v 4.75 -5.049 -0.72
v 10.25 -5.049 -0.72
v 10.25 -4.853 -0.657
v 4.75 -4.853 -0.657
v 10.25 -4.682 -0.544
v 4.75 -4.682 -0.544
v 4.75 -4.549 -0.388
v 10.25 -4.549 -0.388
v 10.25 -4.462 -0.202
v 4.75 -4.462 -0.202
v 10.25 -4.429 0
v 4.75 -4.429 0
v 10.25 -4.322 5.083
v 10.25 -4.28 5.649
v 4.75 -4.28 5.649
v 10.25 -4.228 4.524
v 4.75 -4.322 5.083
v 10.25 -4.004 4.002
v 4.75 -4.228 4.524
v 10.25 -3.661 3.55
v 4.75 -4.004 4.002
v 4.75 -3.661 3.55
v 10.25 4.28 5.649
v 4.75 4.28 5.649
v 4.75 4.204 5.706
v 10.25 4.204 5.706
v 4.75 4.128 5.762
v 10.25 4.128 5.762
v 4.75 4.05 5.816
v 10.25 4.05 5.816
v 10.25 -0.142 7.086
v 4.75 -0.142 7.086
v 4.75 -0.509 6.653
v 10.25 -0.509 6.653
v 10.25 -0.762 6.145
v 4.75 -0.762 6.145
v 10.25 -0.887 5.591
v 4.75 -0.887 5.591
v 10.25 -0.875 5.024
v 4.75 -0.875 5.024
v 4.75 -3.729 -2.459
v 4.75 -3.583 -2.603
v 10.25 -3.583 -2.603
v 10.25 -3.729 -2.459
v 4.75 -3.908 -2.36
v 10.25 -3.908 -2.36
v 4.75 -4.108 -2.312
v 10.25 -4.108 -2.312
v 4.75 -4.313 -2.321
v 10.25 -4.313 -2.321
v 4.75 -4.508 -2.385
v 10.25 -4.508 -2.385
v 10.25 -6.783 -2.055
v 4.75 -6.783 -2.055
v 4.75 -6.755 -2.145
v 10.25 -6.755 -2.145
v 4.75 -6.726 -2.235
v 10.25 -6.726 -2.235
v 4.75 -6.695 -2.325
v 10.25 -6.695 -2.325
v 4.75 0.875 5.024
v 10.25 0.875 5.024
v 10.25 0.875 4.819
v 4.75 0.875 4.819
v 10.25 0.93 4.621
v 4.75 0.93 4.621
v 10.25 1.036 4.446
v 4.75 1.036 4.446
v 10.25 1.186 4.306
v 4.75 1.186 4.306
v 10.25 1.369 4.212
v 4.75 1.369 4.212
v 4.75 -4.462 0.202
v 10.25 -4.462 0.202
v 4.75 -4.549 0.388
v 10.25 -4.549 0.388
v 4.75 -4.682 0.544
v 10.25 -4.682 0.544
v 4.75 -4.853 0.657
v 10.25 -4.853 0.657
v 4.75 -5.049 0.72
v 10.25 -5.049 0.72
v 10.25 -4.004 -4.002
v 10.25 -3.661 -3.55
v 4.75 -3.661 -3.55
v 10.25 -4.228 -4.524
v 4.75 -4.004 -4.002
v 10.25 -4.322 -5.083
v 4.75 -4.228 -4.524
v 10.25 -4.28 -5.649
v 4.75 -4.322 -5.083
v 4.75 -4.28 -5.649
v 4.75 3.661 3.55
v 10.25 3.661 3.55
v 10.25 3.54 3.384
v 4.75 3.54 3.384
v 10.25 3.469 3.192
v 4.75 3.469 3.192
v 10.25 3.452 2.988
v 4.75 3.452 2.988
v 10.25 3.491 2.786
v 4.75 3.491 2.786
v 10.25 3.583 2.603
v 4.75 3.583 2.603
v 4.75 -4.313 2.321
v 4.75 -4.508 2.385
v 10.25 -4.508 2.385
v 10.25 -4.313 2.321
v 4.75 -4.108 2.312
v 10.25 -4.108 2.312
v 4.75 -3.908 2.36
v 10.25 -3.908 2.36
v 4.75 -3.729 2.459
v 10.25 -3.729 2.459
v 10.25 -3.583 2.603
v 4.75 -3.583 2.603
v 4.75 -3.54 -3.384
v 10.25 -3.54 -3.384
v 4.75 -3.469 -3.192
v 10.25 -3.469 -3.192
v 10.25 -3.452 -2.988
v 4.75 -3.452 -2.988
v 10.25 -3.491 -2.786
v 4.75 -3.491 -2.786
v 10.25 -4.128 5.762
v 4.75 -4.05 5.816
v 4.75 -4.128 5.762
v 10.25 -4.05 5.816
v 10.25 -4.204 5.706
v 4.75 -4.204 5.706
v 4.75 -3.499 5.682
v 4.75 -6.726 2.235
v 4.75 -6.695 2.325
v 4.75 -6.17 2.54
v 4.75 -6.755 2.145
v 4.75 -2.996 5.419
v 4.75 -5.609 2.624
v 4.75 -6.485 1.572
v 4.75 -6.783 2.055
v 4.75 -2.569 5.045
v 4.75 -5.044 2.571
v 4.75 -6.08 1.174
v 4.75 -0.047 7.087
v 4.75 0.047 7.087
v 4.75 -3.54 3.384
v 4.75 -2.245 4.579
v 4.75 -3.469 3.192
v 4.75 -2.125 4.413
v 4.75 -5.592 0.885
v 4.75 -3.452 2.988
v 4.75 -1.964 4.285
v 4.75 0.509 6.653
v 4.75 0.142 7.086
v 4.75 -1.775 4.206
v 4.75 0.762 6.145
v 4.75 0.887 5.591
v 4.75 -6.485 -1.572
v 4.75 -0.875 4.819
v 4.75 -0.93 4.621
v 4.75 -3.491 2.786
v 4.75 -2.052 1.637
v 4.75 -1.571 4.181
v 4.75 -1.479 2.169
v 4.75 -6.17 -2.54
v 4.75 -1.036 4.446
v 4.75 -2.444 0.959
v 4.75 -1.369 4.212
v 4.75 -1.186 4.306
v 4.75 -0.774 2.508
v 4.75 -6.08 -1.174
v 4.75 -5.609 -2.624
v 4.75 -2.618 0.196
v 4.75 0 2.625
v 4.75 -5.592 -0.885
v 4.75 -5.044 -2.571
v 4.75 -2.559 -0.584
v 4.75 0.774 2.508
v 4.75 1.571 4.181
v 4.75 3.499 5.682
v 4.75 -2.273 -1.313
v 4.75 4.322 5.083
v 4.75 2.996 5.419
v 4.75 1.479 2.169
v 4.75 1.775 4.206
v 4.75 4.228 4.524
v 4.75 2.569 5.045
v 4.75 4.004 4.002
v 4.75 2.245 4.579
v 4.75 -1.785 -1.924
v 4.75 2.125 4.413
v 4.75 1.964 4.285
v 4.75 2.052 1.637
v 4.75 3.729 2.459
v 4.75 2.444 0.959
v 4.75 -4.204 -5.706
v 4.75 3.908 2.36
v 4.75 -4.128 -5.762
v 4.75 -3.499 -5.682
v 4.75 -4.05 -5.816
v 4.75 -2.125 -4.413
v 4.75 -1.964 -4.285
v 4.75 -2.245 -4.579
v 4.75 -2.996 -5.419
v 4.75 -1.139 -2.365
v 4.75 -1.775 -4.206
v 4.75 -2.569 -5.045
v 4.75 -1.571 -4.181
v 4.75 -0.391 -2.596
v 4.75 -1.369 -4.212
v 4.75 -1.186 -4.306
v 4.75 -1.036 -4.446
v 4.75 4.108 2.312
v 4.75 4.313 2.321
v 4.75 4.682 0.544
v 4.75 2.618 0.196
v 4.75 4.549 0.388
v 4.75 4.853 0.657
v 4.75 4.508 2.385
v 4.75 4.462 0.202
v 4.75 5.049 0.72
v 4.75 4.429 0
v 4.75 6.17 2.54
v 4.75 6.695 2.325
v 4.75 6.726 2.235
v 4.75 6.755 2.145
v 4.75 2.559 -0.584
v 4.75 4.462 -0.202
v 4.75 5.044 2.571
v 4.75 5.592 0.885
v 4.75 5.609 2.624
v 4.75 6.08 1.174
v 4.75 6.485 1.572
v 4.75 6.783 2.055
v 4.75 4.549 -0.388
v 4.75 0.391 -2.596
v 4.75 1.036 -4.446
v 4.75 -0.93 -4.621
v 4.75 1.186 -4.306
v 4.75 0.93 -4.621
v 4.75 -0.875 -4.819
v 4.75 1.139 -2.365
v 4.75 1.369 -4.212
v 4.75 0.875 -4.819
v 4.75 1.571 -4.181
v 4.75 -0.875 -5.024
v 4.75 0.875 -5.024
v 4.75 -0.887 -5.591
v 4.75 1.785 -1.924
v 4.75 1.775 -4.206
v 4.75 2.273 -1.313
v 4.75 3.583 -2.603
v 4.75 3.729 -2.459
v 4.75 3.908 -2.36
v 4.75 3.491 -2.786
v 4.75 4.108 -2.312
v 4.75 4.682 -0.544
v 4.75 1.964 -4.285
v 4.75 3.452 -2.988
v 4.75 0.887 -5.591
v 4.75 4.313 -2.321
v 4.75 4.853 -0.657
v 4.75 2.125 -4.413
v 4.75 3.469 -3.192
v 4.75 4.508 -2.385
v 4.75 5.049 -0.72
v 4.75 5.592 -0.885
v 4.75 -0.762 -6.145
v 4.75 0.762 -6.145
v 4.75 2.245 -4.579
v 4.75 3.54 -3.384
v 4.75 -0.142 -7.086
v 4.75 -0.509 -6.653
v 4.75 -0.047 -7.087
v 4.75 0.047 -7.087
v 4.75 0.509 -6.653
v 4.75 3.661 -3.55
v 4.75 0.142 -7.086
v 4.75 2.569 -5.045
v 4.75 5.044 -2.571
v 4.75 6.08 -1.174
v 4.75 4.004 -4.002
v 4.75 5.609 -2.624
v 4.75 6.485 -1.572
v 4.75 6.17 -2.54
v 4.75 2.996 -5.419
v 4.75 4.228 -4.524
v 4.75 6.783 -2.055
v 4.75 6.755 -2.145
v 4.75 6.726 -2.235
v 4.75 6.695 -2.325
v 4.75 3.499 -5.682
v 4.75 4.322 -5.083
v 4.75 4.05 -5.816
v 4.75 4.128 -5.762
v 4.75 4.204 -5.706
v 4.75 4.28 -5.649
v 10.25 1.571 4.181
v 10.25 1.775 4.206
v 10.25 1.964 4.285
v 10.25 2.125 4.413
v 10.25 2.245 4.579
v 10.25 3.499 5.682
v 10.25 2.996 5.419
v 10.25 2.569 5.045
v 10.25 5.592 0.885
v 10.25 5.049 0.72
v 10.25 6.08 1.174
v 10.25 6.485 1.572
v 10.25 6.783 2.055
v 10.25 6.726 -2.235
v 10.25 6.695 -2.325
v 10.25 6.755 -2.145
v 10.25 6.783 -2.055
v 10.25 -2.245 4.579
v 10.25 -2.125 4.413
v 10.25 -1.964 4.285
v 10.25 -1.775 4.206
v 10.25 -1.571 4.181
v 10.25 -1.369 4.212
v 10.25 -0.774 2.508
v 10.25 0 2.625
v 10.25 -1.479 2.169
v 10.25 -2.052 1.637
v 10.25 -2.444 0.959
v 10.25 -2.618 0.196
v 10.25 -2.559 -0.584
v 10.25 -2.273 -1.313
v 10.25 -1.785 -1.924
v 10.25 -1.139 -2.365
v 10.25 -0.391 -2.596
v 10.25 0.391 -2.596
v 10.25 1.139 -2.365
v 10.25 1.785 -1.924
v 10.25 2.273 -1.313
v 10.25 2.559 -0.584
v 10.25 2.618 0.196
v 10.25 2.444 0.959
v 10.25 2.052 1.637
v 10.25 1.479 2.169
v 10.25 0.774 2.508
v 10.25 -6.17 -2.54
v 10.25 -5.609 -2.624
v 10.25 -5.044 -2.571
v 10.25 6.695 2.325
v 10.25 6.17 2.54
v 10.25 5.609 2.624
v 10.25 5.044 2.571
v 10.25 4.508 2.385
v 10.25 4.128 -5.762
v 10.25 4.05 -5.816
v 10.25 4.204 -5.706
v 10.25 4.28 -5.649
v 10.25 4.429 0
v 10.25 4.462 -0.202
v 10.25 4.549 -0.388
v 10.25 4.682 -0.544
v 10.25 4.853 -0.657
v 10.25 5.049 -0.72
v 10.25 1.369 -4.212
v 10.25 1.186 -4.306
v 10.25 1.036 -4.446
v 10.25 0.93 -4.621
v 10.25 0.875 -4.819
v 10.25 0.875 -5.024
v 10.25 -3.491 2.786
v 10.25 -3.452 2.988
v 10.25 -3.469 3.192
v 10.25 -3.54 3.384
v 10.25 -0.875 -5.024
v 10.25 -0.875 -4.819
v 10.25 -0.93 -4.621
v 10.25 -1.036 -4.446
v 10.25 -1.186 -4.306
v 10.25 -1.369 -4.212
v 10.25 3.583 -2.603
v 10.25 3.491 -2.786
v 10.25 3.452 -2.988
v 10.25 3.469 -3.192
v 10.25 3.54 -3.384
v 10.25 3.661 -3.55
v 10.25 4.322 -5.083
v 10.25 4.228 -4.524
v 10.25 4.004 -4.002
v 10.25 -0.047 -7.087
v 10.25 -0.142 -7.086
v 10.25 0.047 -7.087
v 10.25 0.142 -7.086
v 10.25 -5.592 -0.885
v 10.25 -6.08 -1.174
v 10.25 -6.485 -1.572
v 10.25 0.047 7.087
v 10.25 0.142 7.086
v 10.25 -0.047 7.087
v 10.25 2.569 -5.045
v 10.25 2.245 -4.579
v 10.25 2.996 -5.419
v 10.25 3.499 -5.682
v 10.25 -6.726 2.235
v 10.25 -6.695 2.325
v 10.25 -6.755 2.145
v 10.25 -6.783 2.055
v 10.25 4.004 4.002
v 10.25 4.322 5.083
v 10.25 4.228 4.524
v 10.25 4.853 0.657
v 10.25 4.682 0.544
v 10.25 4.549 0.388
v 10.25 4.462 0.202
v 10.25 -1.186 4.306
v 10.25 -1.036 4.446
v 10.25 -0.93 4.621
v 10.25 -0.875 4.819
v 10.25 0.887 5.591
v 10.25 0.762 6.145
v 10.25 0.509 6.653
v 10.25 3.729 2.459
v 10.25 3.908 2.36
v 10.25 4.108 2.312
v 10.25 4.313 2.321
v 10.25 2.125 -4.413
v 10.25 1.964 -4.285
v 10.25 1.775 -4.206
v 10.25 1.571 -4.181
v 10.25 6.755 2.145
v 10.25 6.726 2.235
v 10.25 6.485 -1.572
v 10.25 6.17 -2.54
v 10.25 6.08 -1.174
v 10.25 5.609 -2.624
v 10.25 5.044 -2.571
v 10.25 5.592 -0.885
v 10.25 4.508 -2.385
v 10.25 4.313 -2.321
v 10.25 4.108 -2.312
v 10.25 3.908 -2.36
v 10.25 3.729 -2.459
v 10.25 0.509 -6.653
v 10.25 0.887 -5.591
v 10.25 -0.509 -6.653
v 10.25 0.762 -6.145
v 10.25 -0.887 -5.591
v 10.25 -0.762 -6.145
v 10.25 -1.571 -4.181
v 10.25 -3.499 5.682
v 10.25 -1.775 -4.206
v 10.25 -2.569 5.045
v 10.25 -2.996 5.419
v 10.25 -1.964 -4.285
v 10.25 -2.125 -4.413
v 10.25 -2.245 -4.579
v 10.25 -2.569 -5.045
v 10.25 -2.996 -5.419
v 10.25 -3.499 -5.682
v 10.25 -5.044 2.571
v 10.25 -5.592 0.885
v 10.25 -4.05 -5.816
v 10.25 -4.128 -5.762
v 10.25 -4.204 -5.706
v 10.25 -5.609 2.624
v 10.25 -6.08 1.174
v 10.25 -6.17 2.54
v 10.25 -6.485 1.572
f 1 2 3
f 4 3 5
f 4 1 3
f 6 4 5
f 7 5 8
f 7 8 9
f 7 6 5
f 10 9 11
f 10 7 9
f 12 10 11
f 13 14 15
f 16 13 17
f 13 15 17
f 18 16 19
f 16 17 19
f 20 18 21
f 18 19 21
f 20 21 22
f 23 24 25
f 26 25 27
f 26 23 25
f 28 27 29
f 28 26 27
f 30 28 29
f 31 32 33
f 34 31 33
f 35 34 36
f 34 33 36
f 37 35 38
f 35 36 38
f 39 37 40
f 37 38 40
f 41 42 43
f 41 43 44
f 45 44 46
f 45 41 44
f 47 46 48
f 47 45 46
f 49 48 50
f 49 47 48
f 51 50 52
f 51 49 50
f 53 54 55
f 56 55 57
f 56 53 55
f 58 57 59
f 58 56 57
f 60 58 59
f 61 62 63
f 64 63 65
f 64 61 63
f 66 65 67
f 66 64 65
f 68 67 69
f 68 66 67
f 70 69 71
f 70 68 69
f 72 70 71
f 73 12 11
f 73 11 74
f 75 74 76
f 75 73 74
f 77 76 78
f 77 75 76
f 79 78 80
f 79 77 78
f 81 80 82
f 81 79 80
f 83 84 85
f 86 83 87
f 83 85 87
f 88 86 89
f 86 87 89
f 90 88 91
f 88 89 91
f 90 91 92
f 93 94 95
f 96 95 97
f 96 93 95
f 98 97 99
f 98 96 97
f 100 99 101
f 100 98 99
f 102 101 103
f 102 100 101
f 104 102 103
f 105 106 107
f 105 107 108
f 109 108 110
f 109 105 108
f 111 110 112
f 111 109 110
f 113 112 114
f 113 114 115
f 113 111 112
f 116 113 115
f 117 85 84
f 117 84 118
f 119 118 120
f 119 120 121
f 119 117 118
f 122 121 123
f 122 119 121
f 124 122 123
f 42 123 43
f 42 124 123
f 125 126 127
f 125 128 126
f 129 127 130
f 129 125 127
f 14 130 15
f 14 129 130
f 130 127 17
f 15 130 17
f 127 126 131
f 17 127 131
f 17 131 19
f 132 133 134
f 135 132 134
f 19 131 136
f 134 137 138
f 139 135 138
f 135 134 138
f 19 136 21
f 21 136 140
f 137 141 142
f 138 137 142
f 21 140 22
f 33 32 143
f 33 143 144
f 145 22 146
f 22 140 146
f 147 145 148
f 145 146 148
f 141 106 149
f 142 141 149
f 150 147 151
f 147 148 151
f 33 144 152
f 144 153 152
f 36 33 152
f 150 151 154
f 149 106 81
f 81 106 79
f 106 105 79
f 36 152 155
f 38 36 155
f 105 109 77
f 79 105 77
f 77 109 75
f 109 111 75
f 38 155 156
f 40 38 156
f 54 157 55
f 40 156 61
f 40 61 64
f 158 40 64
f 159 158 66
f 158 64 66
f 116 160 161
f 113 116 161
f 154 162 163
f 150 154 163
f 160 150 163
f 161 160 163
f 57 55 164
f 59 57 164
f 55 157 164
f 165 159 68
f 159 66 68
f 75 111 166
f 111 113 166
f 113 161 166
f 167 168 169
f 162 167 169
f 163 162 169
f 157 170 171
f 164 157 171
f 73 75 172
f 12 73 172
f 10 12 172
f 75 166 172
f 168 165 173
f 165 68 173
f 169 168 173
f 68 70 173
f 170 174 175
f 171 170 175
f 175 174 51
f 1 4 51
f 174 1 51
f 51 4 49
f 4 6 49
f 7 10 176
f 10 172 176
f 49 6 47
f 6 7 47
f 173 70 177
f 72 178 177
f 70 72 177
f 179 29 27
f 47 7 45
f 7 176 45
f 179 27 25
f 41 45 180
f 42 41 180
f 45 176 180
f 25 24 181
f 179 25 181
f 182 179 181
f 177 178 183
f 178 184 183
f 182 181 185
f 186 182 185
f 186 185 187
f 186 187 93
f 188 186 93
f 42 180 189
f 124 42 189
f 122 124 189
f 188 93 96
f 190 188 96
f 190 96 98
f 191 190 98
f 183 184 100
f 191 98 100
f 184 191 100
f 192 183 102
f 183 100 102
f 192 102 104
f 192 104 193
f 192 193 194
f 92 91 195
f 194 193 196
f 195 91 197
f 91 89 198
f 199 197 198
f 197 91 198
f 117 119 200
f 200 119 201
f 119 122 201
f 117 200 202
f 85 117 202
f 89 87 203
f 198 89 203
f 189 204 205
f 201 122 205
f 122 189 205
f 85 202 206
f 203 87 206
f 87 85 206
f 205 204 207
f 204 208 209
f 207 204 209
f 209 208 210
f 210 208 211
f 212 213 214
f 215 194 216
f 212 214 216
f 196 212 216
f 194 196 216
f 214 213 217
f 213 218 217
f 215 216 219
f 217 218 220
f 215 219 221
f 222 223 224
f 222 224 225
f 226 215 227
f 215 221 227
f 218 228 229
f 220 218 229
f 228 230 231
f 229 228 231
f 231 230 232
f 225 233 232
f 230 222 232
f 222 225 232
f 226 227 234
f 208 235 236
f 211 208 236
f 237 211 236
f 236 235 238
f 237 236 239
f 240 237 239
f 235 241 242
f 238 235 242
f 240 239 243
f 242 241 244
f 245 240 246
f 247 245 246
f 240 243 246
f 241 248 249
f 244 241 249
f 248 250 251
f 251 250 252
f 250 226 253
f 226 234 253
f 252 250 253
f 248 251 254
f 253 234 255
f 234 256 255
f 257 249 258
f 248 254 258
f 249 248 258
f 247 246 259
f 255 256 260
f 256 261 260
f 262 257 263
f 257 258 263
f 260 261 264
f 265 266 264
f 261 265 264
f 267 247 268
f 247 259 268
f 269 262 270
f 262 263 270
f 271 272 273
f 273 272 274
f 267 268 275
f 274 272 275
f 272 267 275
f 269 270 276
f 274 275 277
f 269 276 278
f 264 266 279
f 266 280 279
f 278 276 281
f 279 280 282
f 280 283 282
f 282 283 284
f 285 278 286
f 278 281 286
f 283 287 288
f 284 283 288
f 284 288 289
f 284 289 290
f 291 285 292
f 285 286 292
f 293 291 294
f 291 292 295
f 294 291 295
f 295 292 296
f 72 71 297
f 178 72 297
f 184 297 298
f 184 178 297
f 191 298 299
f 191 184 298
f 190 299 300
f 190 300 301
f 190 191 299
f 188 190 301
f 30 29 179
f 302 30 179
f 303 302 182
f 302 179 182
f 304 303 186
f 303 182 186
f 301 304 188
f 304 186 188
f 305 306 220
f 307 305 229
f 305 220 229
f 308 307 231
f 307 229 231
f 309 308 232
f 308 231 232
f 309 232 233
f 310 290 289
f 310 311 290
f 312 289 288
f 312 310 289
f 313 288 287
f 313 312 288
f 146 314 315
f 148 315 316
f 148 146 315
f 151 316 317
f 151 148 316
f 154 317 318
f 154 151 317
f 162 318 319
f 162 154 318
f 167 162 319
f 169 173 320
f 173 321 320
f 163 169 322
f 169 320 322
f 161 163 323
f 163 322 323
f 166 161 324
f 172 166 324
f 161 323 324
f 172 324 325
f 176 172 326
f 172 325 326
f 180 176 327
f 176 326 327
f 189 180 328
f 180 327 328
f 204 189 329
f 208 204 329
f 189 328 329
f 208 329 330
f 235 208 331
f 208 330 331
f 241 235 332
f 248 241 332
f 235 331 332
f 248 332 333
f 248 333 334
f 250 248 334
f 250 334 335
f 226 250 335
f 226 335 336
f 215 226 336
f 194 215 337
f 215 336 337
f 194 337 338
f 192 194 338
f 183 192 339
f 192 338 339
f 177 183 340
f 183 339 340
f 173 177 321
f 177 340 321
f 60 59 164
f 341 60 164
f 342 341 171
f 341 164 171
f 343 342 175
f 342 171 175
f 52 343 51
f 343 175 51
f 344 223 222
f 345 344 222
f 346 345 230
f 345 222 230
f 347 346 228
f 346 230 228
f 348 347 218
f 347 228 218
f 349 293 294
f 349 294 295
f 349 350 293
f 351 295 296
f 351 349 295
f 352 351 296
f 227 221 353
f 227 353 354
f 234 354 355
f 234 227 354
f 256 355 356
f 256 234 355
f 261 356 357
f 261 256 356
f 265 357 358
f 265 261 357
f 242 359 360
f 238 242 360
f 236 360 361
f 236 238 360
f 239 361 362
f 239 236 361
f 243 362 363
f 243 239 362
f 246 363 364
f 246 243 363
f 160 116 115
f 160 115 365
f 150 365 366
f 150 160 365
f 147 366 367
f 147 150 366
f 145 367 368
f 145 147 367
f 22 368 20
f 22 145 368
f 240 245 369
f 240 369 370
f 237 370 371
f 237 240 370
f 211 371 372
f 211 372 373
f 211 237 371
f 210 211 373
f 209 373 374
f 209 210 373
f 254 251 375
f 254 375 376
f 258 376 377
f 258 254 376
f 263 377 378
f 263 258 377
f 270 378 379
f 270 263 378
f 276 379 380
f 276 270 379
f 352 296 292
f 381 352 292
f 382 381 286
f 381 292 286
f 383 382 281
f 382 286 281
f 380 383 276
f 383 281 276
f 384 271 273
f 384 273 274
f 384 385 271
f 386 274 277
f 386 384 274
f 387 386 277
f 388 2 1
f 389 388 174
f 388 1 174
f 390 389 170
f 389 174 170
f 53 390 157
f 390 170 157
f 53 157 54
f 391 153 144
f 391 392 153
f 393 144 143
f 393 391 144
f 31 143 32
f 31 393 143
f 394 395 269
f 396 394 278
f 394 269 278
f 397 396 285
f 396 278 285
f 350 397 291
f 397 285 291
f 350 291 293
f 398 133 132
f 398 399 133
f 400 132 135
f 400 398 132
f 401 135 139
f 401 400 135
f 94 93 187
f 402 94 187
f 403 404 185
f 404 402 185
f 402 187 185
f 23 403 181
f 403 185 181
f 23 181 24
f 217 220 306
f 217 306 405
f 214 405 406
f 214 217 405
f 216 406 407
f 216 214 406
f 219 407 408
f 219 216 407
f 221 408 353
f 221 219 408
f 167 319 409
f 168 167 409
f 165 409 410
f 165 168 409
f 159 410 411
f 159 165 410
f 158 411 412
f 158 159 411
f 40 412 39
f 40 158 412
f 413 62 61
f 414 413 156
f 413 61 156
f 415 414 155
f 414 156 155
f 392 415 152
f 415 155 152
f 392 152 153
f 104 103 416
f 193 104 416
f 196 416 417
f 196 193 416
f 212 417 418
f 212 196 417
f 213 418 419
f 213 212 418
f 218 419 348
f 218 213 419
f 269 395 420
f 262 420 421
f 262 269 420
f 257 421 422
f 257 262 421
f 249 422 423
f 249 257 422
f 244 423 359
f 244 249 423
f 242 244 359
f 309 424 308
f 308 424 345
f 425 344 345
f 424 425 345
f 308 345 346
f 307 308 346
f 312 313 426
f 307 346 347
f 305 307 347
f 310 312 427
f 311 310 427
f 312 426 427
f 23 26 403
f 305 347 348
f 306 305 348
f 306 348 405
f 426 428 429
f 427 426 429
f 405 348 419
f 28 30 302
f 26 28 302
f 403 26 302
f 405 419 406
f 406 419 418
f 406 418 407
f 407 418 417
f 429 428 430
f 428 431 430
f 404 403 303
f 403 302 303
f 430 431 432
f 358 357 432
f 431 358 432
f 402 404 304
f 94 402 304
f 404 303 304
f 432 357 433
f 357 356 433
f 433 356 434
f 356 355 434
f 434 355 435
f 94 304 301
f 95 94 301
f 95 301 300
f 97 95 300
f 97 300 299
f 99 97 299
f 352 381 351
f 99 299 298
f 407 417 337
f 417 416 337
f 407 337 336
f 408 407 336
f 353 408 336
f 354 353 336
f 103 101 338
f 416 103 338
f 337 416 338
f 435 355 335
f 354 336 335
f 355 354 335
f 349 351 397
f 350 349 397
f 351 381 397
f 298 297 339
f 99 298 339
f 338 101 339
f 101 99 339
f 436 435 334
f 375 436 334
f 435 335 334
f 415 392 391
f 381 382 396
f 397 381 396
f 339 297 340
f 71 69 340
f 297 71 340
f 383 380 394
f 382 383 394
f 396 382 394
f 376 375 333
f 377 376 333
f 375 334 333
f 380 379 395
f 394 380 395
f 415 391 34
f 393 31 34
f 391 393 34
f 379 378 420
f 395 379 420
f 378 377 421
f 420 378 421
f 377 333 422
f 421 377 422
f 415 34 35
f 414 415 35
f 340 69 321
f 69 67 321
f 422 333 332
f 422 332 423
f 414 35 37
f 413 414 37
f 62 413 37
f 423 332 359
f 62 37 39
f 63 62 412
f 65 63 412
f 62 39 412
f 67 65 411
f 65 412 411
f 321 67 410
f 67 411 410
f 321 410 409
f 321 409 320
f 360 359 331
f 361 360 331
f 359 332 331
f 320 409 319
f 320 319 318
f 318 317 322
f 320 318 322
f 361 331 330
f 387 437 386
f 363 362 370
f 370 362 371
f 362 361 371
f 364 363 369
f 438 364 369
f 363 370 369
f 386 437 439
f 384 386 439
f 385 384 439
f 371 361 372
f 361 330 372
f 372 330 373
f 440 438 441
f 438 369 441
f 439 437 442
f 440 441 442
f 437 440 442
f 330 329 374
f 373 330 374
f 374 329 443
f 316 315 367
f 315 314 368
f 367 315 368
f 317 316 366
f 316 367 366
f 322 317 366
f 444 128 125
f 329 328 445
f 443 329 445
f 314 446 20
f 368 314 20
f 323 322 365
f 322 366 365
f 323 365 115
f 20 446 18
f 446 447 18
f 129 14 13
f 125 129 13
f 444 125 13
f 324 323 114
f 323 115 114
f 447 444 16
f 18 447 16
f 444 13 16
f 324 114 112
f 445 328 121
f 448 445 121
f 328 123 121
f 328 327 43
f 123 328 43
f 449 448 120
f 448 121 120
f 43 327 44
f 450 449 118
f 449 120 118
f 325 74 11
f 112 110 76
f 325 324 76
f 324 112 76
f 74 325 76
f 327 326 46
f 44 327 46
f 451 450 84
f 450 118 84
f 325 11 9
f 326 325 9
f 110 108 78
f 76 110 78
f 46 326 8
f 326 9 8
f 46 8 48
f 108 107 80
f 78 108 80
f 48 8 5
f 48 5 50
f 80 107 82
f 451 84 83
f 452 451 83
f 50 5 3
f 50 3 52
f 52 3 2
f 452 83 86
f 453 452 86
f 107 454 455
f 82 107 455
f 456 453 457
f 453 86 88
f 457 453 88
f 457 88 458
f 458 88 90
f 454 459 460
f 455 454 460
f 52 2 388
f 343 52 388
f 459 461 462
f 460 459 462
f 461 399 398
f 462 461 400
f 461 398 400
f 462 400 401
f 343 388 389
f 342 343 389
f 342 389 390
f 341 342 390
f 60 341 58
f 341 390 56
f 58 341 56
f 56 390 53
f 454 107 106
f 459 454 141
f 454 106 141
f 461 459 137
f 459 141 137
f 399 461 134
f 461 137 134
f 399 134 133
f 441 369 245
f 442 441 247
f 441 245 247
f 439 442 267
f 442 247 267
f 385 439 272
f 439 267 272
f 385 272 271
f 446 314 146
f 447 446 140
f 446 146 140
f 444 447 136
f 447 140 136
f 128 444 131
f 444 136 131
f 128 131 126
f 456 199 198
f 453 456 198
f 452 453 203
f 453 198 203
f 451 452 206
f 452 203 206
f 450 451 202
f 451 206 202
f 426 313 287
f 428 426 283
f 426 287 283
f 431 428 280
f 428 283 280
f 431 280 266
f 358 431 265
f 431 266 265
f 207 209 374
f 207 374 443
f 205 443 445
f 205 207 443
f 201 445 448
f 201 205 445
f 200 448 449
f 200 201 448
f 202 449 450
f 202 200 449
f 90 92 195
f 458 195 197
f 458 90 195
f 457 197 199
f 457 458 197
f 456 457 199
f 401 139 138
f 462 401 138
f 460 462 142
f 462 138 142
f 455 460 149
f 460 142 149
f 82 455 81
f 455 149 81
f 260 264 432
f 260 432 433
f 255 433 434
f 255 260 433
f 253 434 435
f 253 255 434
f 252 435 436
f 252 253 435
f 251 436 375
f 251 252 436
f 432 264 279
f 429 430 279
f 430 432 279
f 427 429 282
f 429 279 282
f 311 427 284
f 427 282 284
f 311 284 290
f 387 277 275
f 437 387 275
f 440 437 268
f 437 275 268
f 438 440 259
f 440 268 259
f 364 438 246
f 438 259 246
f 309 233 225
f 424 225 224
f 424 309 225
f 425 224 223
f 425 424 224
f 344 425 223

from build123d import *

# Parameters (mm, degrees)
BASPROSKE_W        = 10
BASPROSKE_H        = 6.75
TOOTHCUT_DEPTH     = 14.824796563
TEETHCUTS_COUNT    = 10
TEETHCUTS_ANGLE    = 324
BORSKE_R           = 2.5
BORE_DEPTH         = 50.0000508
SCALE1_SCALE       = 1.05
FILLET1_R          = 0.75
CUT_EXTRUDE1_START = -10.5
SKETCH1_R          = 10.265831804
CUT_EXTRUDE1_DEPTH = 5


with BuildPart() as part:
    # BasProSke → Base-Revolve (revolve)
    with BuildSketch(Plane(origin=(0, 0, 0), x_dir=(1, 0, 0), z_dir=(0, 1, 0)), mode=Mode.PRIVATE) as base_revolve_sk:
        with Locations((5, 3.375)):
            Rectangle(BASPROSKE_W, BASPROSKE_H)
    revolve(base_revolve_sk.sketch.rotate(Axis((-10, 0, 0), (1, 0, 0)), 180), axis=Axis((-10, 0, 0), (1, 0, 0)))

    # TooCutSke → ToothCut (cut, through all)
    with BuildSketch(Plane(origin=(0, 0, 0), x_dir=(0, 0, -1), z_dir=(1, 0, 0))):
        with BuildLine():
            ThreePointArc((0.665884296, 4.164854519), (0, 4.21775), (-0.665884296, 4.164854519))
            ThreePointArc((-0.665884296, 4.164854519), (-0.949936307, 5.537806691), (-1.991778305, 6.476022262))
            ThreePointArc((-1.991778305, 6.476022262), (0, 6.7754), (1.991778305, 6.476022262))
            ThreePointArc((1.991778305, 6.476022262), (0.949936307, 5.537806691), (0.665884296, 4.164854519))
        make_face()
    toothcut = extrude(amount=TOOTHCUT_DEPTH, mode=Mode.SUBTRACT)

    # TeethCuts: ToothCut ×10 about axis
    teethcuts_axis = Axis((-10, 0, 0), (1, 0, 0))
    for i in range(1, TEETHCUTS_COUNT):
        add(toothcut.rotate(teethcuts_axis, i * TEETHCUTS_ANGLE / (TEETHCUTS_COUNT - 1)), mode=Mode.SUBTRACT)

    # BorSke → Bore (cut, symmetric)
    with BuildSketch(Plane(origin=(0, 0, 0), x_dir=(0, 0, -1), z_dir=(1, 0, 0))):
        with Locations(Location((0, 0, 0), (0, 0, 180))):
            Circle(BORSKE_R)
    extrude(amount=BORE_DEPTH, both=True, mode=Mode.SUBTRACT)


with BuildPart() as part_1:
    # Scale1: scaled about (5, 0, 0)
    add(part.part.scale(SCALE1_SCALE).moved(Location((-0.25, 0, 0))))

    # Fillet1
    # the kernel refuses this fillet: 0.75 mm, written as the material it adds along each edge
    with BuildSketch(Plane(origin=(-0.25, 3.126943172, -3.136089365), x_dir=(0, 0.6486282387058202, 0.7611053855763902), z_dir=(1, 0, 0)), Plane(origin=(-0.25, 0.686403088, -4.375120673), x_dir=(0, 0.9721177892266772, 0.23449307850987308), z_dir=(1, 0, 0)), Plane(origin=(-0.25, -2.016319645, -3.94300459), x_dir=(0, 0.9242913853313495, -0.38168761442081794), z_dir=(1, 0, 0)), Plane(origin=(-0.25, -3.948876807, -2.004794771), x_dir=(0, 0.5234170877481713, -0.8520766117276212), z_dir=(1, 0, 0)), Plane(origin=(-0.25, -4.373097245, 0.69917851), x_dir=(0, -0.07738474706232469, -0.9970013043733192), z_dir=(1, 0, 0))) as fillet1_piece_1:
        with BuildLine():
            CenterArc((0.778083465, -0.747536247), FILLET1_R, 94.645414963, 79.810658705)
            ThreePointArc((0.031591647, -0.675079607), (0.040059779, -0.336404325), (0, 0))
            ThreePointArc((0, 0), (0.358670863, -0.01454809), (0.717341725, 0))
        make_face()
    extrude(amount=10.5)
    with BuildSketch(Plane(origin=(-0.25, 3.948876807, -2.004794771), x_dir=(0, 0.8266776070022068, -0.562675869467587), z_dir=(1, 0, 0)), Plane(origin=(-0.25, 2.016319645, -3.94300459), x_dir=(0, 0.3380636550401047, -0.9411232465203083), z_dir=(1, 0, 0)), Plane(origin=(-0.25, -0.686403088, -4.375120673), x_dir=(0, -0.27967912278629736, -0.9600935310049158), z_dir=(1, 0, 0)), Plane(origin=(-0.25, -3.126943172, -3.136089365), x_dir=(0, -0.7905939816520889, -0.6123407190245448), z_dir=(1, 0, 0)), Plane(origin=(-0.25, -4.373097245, -0.69917851), x_dir=(0, -0.9995288108278918, -0.030694565072345244), z_dir=(1, 0, 0))) as fillet1_piece_2:
        with BuildLine():
            CenterArc((0.78309116, -0.742288727), FILLET1_R, 98.223237645, 79.810658705)
            ThreePointArc((0.033532686, -0.716557541), (0.031298529, -0.357598709), (0, 0))
            ThreePointArc((0, 0), (0.337909199, -0.024290509), (0.675818399, 0))
        make_face()
    extrude(amount=10.5)
    with BuildSketch(Plane(origin=(-0.25, -3.948876807, 2.004794771), x_dir=(0, 0.5234170877481569, 0.8520766117276299), z_dir=(1, 0, 0)), Plane(origin=(-0.25, -2.016319645, 3.94300459), x_dir=(0, 0.9242913853313433, 0.38168761442083243), z_dir=(1, 0, 0)), Plane(origin=(-0.25, 0.686403088, 4.375120673), x_dir=(0, 0.9721177892266811, -0.23449307850985693), z_dir=(1, 0, 0)), Plane(origin=(-0.25, 3.126943172, 3.136089365), x_dir=(0, 0.6486282387058309, -0.761105385576381), z_dir=(1, 0, 0)), Plane(origin=(-0.25, 4.373097245, 0.69917851), x_dir=(0, 0.07738474706233216, -0.9970013043733188), z_dir=(1, 0, 0))) as fillet1_piece_3:
        with BuildLine():
            CenterArc((0.778083465, 0.747536247), FILLET1_R, 185.543926332, 79.810658705)
            ThreePointArc((0.031591647, 0.675079607), (0.040059779, 0.336404325), (0, 0))
            ThreePointArc((0, 0), (0.358670863, 0.01454809), (0.717341725, 0))
        make_face()
    extrude(amount=10.5)
    with BuildSketch(Plane(origin=(-0.25, -3.126943172, 3.136089365), x_dir=(0, -0.7905939816520986, 0.6123407190245325), z_dir=(1, 0, 0)), Plane(origin=(-0.25, -0.686403088, 4.375120673), x_dir=(0, -0.2796791227863126, 0.9600935310049113), z_dir=(1, 0, 0)), Plane(origin=(-0.25, 2.016319645, 3.94300459), x_dir=(0, 0.33806365504009167, 0.9411232465203131), z_dir=(1, 0, 0)), Plane(origin=(-0.25, 3.948876807, 2.004794771), x_dir=(0, 0.826677607002198, 0.5626758694676001), z_dir=(1, 0, 0)), Plane(origin=(-0.25, 4.373097245, -0.69917851), x_dir=(0, 0.9995288108278919, -0.030694565072338184), z_dir=(1, 0, 0))) as fillet1_piece_4:
        with BuildLine():
            CenterArc((0.78309116, 0.742288727), FILLET1_R, 181.96610365, 79.810658705)
            ThreePointArc((0.033532686, 0.716557541), (0.031298529, 0.357598709), (0, 0))
            ThreePointArc((0, 0), (0.337909199, 0.024290509), (0.675818399, 0))
        make_face()
    extrude(amount=10.5)

    # Sketch1 → Cut-Extrude1 (cut)
    with BuildSketch(Plane(origin=(10.25, 0, 0), x_dir=(0, 0, -1), z_dir=(1, 0, 0)).offset(CUT_EXTRUDE1_START)):
        Circle(SKETCH1_R)
    extrude(amount=CUT_EXTRUDE1_DEPTH, mode=Mode.SUBTRACT)


solid = part_1.part
